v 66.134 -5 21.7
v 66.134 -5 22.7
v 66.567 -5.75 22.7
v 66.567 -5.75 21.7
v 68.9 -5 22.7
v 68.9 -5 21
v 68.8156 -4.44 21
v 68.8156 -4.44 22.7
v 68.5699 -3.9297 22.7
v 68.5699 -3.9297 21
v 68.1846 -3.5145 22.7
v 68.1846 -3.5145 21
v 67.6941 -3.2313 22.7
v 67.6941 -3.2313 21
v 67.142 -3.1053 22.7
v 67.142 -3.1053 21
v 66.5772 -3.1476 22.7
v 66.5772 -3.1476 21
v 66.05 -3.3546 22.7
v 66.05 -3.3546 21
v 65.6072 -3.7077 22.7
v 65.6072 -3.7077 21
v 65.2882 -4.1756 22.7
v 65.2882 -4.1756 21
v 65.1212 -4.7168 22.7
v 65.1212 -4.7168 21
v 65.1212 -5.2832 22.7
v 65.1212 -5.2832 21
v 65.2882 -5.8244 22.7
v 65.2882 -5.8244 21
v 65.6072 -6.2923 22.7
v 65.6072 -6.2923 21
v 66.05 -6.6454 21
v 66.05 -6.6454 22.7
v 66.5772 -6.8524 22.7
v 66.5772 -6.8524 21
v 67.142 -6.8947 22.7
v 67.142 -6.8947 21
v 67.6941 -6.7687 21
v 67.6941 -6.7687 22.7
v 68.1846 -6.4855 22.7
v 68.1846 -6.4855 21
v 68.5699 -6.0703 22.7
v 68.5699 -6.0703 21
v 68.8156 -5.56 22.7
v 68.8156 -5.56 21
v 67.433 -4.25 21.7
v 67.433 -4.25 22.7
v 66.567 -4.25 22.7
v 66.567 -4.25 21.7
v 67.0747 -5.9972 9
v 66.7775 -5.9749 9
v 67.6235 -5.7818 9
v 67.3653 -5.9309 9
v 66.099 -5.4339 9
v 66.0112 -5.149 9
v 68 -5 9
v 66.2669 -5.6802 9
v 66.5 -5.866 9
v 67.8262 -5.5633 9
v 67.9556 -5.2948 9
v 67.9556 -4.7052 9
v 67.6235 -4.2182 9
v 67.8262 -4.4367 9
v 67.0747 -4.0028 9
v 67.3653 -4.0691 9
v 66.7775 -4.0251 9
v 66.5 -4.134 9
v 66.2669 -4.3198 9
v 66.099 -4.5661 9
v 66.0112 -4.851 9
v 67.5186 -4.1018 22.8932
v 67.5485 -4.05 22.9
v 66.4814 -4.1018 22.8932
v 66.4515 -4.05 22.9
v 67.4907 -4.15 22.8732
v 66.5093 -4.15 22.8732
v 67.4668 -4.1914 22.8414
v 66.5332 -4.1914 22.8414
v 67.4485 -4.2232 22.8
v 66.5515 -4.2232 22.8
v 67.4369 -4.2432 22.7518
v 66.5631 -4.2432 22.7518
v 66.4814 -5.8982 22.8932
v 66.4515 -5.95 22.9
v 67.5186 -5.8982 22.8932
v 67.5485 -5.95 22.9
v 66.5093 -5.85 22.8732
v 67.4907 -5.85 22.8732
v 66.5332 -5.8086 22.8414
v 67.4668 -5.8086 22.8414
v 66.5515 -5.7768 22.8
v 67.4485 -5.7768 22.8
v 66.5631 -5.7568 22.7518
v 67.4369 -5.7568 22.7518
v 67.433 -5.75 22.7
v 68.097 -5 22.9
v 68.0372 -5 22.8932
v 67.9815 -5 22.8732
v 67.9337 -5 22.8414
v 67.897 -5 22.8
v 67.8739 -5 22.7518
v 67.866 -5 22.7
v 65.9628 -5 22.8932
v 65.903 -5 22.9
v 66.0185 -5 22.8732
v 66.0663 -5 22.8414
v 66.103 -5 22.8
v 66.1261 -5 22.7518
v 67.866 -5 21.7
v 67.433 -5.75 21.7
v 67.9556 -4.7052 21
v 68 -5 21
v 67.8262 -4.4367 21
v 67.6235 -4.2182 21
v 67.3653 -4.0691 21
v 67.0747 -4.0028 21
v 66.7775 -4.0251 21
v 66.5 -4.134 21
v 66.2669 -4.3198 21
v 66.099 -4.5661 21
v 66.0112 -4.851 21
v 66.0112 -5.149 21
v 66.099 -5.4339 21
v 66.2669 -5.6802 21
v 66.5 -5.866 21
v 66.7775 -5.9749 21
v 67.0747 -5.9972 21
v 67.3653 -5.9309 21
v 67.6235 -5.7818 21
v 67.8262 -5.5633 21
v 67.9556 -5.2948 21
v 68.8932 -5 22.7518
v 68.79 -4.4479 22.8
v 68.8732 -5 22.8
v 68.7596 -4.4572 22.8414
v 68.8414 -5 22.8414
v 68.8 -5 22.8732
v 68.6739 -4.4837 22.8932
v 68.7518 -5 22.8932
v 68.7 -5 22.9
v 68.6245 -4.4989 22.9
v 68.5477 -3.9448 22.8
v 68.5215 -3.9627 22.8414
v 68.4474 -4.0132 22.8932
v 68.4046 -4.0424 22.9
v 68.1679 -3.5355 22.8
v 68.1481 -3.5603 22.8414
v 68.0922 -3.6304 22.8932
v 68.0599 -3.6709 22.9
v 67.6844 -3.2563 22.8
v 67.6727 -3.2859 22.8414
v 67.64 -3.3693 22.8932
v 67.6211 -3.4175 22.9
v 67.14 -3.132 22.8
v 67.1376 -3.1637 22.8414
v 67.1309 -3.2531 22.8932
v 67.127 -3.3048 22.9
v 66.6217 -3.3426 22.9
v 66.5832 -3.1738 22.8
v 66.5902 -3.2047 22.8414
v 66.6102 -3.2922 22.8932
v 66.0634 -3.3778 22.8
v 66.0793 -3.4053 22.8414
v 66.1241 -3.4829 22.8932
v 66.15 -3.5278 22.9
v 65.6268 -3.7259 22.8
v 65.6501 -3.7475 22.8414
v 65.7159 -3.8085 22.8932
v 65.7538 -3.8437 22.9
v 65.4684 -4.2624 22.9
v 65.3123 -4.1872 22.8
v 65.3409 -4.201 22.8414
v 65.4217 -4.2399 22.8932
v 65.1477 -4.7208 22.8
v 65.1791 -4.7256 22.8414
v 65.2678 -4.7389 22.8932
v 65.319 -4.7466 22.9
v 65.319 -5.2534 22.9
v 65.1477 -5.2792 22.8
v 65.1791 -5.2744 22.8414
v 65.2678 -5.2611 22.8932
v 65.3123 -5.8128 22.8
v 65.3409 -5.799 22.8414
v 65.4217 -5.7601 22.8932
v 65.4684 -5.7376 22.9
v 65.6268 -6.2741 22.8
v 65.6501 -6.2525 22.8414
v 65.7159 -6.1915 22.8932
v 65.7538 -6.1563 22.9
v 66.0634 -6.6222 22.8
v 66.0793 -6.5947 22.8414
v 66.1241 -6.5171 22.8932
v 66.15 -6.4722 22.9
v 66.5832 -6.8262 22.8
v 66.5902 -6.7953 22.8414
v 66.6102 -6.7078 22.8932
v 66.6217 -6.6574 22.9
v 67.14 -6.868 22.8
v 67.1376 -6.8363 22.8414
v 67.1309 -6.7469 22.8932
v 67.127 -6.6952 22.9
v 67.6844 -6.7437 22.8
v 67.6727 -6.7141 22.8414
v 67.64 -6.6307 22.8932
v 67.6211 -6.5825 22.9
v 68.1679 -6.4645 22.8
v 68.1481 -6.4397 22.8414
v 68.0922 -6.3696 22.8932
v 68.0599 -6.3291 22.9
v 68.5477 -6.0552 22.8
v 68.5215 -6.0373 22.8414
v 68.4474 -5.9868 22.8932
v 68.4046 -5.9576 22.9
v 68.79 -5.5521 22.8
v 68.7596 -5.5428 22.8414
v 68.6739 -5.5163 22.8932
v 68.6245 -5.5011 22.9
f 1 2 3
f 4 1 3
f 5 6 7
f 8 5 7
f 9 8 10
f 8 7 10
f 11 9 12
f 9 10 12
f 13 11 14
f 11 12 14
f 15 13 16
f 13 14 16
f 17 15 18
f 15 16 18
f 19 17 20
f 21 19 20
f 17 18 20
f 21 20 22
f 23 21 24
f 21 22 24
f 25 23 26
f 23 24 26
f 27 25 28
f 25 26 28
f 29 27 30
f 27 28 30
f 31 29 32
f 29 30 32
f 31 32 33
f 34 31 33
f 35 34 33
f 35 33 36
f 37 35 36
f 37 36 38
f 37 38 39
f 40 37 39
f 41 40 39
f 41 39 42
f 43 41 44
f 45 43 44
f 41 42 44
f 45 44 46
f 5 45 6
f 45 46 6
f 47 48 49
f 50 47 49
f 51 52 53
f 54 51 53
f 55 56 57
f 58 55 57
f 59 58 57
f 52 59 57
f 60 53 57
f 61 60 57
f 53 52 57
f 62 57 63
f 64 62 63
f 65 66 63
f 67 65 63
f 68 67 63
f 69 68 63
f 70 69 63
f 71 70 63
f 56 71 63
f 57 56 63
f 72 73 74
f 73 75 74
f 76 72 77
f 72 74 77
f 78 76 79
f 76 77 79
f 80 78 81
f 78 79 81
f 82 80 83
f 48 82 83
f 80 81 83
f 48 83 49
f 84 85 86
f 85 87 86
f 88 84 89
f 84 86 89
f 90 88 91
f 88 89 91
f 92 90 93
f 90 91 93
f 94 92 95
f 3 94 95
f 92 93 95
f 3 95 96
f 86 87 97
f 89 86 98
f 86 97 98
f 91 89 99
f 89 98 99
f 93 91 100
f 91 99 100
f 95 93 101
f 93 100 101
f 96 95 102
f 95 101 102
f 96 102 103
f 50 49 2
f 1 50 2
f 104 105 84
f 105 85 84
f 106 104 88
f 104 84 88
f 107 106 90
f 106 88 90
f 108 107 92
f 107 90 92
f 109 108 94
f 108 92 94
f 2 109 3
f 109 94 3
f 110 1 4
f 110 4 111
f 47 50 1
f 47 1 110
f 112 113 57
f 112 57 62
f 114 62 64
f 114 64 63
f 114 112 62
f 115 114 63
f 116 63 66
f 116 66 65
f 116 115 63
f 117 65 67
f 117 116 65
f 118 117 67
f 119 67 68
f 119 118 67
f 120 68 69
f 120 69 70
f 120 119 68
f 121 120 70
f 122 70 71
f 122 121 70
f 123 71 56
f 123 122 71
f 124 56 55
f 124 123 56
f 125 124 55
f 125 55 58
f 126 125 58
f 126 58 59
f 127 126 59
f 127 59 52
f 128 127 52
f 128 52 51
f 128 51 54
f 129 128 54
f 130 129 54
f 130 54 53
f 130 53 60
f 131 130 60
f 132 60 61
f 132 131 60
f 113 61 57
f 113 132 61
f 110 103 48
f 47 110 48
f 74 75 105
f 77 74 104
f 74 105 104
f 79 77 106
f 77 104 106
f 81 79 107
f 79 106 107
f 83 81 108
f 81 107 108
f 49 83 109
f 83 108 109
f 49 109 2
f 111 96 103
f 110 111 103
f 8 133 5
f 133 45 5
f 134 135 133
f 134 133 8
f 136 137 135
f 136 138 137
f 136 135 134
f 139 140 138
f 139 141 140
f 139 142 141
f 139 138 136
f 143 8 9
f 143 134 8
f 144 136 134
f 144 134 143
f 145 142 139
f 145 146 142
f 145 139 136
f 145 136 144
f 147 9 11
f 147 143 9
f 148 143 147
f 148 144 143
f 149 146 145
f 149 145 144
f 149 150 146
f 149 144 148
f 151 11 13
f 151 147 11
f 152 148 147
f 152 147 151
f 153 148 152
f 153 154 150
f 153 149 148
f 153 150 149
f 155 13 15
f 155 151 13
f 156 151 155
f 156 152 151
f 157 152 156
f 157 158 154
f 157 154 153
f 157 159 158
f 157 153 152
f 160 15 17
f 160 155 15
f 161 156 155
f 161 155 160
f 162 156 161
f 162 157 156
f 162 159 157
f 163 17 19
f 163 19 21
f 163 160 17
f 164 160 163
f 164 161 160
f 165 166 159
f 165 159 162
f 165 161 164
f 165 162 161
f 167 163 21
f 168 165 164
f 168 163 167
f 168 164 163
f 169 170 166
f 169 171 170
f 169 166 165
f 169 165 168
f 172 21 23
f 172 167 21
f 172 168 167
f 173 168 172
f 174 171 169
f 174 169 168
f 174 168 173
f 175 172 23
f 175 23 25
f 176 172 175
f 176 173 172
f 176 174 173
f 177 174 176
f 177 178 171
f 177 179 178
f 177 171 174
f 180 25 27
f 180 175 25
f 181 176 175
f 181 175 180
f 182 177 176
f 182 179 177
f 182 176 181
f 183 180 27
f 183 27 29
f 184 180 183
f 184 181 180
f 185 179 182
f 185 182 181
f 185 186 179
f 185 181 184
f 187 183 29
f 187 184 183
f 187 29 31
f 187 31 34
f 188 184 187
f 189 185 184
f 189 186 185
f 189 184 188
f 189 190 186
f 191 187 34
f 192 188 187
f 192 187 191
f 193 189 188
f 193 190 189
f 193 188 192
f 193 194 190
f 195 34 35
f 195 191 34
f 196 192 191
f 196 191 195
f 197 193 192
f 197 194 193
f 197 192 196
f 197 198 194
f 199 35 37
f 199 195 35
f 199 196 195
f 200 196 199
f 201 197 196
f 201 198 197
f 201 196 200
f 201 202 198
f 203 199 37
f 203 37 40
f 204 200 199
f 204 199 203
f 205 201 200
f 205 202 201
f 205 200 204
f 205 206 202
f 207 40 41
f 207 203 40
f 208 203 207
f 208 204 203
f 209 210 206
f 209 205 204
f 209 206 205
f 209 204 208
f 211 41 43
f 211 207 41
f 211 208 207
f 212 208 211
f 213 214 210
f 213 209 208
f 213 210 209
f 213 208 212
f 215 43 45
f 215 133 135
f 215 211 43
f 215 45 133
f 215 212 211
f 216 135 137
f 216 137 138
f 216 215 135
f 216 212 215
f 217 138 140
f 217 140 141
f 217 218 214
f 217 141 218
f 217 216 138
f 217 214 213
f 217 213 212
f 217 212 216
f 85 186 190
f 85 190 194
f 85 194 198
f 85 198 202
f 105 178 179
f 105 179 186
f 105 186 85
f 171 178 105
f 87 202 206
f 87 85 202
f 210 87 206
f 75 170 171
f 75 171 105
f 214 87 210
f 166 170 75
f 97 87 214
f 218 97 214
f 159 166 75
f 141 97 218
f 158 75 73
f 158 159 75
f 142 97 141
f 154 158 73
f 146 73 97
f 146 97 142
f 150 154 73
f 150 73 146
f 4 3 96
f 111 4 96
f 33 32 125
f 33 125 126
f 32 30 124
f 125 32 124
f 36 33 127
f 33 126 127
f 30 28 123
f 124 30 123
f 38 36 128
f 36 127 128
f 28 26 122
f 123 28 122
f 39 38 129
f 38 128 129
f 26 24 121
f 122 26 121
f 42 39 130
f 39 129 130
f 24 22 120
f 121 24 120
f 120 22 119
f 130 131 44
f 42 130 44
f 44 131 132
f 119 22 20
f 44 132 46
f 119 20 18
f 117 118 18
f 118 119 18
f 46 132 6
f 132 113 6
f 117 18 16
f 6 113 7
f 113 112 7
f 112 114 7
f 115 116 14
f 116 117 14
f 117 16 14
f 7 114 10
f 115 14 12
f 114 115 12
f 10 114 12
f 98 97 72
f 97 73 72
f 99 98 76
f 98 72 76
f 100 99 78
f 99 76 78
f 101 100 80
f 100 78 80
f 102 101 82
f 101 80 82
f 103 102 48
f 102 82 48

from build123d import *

# Parameters (mm, degrees)
SKETCH042_R              = 1.9
PAD007_DEPTH             = 1.9
POCKET024_DEPTH          = 1.2
SKETCH044_R              = 1
PAD008_DEPTH             = 12
FILLET005_R              = 0.2
BODY008_PLACEMENT_ANGLE  = 90
CLONE004_PLACEMENT_ANGLE = 90


with BuildPart() as part:
    # Sketch042 → Pad007 (new body)
    with BuildSketch(Plane.XY):
        Circle(SKETCH042_R)
    extrude(amount=PAD007_DEPTH)

    # Sketch043 (on Face3 of Pad007) → Pocket024 (cut)
    with BuildSketch(Plane.XY.offset(1.9)):
        Polygon((0.866025, 0), (0.433013, 0.75), (-0.433013, 0.75), (-0.866025, 0), (-0.433013, -0.75), (0.433013, -0.75), align=None)
    extrude(amount=-POCKET024_DEPTH, mode=Mode.SUBTRACT)

    # Sketch044 → Pad008 (join)
    with BuildSketch(Plane.XY):
        Circle(SKETCH044_R)
    extrude(amount=-PAD008_DEPTH)

    # Fillet005
    fillet005_edges = [part.edges().sort_by_distance(p)[0] for p in [
        (-1.9, 0, 1.9),
        (-0.649519, 0.375, 1.9),
        (-0.649519, -0.375, 1.9),
        (0, -0.75, 1.9),
        (0.649519, -0.375, 1.9),
        (0.649519, 0.375, 1.9),
        (0, 0.75, 1.9),
    ]]
    fillet(fillet005_edges, radius=FILLET005_R)


with BuildPart() as part_1:
    # Body008 placement: moved
    add(part.part.moved(Location((40, -5, 15))).rotate(Axis((40, -5, 15), (1, 0, 0)), BODY008_PLACEMENT_ANGLE))


with BuildPart() as part_2:
    # Clone004 placement: moved
    add(part_1.part.moved(Location((-40, -15, -5))).rotate(Axis((-40, -15, -5), (-1, 0, 0)), CLONE004_PLACEMENT_ANGLE))


with BuildPart() as part_3:
    # Body011 placement: moved
    add(part_2.part.moved(Location((67, -5, 21))))


solid = part_3.part
